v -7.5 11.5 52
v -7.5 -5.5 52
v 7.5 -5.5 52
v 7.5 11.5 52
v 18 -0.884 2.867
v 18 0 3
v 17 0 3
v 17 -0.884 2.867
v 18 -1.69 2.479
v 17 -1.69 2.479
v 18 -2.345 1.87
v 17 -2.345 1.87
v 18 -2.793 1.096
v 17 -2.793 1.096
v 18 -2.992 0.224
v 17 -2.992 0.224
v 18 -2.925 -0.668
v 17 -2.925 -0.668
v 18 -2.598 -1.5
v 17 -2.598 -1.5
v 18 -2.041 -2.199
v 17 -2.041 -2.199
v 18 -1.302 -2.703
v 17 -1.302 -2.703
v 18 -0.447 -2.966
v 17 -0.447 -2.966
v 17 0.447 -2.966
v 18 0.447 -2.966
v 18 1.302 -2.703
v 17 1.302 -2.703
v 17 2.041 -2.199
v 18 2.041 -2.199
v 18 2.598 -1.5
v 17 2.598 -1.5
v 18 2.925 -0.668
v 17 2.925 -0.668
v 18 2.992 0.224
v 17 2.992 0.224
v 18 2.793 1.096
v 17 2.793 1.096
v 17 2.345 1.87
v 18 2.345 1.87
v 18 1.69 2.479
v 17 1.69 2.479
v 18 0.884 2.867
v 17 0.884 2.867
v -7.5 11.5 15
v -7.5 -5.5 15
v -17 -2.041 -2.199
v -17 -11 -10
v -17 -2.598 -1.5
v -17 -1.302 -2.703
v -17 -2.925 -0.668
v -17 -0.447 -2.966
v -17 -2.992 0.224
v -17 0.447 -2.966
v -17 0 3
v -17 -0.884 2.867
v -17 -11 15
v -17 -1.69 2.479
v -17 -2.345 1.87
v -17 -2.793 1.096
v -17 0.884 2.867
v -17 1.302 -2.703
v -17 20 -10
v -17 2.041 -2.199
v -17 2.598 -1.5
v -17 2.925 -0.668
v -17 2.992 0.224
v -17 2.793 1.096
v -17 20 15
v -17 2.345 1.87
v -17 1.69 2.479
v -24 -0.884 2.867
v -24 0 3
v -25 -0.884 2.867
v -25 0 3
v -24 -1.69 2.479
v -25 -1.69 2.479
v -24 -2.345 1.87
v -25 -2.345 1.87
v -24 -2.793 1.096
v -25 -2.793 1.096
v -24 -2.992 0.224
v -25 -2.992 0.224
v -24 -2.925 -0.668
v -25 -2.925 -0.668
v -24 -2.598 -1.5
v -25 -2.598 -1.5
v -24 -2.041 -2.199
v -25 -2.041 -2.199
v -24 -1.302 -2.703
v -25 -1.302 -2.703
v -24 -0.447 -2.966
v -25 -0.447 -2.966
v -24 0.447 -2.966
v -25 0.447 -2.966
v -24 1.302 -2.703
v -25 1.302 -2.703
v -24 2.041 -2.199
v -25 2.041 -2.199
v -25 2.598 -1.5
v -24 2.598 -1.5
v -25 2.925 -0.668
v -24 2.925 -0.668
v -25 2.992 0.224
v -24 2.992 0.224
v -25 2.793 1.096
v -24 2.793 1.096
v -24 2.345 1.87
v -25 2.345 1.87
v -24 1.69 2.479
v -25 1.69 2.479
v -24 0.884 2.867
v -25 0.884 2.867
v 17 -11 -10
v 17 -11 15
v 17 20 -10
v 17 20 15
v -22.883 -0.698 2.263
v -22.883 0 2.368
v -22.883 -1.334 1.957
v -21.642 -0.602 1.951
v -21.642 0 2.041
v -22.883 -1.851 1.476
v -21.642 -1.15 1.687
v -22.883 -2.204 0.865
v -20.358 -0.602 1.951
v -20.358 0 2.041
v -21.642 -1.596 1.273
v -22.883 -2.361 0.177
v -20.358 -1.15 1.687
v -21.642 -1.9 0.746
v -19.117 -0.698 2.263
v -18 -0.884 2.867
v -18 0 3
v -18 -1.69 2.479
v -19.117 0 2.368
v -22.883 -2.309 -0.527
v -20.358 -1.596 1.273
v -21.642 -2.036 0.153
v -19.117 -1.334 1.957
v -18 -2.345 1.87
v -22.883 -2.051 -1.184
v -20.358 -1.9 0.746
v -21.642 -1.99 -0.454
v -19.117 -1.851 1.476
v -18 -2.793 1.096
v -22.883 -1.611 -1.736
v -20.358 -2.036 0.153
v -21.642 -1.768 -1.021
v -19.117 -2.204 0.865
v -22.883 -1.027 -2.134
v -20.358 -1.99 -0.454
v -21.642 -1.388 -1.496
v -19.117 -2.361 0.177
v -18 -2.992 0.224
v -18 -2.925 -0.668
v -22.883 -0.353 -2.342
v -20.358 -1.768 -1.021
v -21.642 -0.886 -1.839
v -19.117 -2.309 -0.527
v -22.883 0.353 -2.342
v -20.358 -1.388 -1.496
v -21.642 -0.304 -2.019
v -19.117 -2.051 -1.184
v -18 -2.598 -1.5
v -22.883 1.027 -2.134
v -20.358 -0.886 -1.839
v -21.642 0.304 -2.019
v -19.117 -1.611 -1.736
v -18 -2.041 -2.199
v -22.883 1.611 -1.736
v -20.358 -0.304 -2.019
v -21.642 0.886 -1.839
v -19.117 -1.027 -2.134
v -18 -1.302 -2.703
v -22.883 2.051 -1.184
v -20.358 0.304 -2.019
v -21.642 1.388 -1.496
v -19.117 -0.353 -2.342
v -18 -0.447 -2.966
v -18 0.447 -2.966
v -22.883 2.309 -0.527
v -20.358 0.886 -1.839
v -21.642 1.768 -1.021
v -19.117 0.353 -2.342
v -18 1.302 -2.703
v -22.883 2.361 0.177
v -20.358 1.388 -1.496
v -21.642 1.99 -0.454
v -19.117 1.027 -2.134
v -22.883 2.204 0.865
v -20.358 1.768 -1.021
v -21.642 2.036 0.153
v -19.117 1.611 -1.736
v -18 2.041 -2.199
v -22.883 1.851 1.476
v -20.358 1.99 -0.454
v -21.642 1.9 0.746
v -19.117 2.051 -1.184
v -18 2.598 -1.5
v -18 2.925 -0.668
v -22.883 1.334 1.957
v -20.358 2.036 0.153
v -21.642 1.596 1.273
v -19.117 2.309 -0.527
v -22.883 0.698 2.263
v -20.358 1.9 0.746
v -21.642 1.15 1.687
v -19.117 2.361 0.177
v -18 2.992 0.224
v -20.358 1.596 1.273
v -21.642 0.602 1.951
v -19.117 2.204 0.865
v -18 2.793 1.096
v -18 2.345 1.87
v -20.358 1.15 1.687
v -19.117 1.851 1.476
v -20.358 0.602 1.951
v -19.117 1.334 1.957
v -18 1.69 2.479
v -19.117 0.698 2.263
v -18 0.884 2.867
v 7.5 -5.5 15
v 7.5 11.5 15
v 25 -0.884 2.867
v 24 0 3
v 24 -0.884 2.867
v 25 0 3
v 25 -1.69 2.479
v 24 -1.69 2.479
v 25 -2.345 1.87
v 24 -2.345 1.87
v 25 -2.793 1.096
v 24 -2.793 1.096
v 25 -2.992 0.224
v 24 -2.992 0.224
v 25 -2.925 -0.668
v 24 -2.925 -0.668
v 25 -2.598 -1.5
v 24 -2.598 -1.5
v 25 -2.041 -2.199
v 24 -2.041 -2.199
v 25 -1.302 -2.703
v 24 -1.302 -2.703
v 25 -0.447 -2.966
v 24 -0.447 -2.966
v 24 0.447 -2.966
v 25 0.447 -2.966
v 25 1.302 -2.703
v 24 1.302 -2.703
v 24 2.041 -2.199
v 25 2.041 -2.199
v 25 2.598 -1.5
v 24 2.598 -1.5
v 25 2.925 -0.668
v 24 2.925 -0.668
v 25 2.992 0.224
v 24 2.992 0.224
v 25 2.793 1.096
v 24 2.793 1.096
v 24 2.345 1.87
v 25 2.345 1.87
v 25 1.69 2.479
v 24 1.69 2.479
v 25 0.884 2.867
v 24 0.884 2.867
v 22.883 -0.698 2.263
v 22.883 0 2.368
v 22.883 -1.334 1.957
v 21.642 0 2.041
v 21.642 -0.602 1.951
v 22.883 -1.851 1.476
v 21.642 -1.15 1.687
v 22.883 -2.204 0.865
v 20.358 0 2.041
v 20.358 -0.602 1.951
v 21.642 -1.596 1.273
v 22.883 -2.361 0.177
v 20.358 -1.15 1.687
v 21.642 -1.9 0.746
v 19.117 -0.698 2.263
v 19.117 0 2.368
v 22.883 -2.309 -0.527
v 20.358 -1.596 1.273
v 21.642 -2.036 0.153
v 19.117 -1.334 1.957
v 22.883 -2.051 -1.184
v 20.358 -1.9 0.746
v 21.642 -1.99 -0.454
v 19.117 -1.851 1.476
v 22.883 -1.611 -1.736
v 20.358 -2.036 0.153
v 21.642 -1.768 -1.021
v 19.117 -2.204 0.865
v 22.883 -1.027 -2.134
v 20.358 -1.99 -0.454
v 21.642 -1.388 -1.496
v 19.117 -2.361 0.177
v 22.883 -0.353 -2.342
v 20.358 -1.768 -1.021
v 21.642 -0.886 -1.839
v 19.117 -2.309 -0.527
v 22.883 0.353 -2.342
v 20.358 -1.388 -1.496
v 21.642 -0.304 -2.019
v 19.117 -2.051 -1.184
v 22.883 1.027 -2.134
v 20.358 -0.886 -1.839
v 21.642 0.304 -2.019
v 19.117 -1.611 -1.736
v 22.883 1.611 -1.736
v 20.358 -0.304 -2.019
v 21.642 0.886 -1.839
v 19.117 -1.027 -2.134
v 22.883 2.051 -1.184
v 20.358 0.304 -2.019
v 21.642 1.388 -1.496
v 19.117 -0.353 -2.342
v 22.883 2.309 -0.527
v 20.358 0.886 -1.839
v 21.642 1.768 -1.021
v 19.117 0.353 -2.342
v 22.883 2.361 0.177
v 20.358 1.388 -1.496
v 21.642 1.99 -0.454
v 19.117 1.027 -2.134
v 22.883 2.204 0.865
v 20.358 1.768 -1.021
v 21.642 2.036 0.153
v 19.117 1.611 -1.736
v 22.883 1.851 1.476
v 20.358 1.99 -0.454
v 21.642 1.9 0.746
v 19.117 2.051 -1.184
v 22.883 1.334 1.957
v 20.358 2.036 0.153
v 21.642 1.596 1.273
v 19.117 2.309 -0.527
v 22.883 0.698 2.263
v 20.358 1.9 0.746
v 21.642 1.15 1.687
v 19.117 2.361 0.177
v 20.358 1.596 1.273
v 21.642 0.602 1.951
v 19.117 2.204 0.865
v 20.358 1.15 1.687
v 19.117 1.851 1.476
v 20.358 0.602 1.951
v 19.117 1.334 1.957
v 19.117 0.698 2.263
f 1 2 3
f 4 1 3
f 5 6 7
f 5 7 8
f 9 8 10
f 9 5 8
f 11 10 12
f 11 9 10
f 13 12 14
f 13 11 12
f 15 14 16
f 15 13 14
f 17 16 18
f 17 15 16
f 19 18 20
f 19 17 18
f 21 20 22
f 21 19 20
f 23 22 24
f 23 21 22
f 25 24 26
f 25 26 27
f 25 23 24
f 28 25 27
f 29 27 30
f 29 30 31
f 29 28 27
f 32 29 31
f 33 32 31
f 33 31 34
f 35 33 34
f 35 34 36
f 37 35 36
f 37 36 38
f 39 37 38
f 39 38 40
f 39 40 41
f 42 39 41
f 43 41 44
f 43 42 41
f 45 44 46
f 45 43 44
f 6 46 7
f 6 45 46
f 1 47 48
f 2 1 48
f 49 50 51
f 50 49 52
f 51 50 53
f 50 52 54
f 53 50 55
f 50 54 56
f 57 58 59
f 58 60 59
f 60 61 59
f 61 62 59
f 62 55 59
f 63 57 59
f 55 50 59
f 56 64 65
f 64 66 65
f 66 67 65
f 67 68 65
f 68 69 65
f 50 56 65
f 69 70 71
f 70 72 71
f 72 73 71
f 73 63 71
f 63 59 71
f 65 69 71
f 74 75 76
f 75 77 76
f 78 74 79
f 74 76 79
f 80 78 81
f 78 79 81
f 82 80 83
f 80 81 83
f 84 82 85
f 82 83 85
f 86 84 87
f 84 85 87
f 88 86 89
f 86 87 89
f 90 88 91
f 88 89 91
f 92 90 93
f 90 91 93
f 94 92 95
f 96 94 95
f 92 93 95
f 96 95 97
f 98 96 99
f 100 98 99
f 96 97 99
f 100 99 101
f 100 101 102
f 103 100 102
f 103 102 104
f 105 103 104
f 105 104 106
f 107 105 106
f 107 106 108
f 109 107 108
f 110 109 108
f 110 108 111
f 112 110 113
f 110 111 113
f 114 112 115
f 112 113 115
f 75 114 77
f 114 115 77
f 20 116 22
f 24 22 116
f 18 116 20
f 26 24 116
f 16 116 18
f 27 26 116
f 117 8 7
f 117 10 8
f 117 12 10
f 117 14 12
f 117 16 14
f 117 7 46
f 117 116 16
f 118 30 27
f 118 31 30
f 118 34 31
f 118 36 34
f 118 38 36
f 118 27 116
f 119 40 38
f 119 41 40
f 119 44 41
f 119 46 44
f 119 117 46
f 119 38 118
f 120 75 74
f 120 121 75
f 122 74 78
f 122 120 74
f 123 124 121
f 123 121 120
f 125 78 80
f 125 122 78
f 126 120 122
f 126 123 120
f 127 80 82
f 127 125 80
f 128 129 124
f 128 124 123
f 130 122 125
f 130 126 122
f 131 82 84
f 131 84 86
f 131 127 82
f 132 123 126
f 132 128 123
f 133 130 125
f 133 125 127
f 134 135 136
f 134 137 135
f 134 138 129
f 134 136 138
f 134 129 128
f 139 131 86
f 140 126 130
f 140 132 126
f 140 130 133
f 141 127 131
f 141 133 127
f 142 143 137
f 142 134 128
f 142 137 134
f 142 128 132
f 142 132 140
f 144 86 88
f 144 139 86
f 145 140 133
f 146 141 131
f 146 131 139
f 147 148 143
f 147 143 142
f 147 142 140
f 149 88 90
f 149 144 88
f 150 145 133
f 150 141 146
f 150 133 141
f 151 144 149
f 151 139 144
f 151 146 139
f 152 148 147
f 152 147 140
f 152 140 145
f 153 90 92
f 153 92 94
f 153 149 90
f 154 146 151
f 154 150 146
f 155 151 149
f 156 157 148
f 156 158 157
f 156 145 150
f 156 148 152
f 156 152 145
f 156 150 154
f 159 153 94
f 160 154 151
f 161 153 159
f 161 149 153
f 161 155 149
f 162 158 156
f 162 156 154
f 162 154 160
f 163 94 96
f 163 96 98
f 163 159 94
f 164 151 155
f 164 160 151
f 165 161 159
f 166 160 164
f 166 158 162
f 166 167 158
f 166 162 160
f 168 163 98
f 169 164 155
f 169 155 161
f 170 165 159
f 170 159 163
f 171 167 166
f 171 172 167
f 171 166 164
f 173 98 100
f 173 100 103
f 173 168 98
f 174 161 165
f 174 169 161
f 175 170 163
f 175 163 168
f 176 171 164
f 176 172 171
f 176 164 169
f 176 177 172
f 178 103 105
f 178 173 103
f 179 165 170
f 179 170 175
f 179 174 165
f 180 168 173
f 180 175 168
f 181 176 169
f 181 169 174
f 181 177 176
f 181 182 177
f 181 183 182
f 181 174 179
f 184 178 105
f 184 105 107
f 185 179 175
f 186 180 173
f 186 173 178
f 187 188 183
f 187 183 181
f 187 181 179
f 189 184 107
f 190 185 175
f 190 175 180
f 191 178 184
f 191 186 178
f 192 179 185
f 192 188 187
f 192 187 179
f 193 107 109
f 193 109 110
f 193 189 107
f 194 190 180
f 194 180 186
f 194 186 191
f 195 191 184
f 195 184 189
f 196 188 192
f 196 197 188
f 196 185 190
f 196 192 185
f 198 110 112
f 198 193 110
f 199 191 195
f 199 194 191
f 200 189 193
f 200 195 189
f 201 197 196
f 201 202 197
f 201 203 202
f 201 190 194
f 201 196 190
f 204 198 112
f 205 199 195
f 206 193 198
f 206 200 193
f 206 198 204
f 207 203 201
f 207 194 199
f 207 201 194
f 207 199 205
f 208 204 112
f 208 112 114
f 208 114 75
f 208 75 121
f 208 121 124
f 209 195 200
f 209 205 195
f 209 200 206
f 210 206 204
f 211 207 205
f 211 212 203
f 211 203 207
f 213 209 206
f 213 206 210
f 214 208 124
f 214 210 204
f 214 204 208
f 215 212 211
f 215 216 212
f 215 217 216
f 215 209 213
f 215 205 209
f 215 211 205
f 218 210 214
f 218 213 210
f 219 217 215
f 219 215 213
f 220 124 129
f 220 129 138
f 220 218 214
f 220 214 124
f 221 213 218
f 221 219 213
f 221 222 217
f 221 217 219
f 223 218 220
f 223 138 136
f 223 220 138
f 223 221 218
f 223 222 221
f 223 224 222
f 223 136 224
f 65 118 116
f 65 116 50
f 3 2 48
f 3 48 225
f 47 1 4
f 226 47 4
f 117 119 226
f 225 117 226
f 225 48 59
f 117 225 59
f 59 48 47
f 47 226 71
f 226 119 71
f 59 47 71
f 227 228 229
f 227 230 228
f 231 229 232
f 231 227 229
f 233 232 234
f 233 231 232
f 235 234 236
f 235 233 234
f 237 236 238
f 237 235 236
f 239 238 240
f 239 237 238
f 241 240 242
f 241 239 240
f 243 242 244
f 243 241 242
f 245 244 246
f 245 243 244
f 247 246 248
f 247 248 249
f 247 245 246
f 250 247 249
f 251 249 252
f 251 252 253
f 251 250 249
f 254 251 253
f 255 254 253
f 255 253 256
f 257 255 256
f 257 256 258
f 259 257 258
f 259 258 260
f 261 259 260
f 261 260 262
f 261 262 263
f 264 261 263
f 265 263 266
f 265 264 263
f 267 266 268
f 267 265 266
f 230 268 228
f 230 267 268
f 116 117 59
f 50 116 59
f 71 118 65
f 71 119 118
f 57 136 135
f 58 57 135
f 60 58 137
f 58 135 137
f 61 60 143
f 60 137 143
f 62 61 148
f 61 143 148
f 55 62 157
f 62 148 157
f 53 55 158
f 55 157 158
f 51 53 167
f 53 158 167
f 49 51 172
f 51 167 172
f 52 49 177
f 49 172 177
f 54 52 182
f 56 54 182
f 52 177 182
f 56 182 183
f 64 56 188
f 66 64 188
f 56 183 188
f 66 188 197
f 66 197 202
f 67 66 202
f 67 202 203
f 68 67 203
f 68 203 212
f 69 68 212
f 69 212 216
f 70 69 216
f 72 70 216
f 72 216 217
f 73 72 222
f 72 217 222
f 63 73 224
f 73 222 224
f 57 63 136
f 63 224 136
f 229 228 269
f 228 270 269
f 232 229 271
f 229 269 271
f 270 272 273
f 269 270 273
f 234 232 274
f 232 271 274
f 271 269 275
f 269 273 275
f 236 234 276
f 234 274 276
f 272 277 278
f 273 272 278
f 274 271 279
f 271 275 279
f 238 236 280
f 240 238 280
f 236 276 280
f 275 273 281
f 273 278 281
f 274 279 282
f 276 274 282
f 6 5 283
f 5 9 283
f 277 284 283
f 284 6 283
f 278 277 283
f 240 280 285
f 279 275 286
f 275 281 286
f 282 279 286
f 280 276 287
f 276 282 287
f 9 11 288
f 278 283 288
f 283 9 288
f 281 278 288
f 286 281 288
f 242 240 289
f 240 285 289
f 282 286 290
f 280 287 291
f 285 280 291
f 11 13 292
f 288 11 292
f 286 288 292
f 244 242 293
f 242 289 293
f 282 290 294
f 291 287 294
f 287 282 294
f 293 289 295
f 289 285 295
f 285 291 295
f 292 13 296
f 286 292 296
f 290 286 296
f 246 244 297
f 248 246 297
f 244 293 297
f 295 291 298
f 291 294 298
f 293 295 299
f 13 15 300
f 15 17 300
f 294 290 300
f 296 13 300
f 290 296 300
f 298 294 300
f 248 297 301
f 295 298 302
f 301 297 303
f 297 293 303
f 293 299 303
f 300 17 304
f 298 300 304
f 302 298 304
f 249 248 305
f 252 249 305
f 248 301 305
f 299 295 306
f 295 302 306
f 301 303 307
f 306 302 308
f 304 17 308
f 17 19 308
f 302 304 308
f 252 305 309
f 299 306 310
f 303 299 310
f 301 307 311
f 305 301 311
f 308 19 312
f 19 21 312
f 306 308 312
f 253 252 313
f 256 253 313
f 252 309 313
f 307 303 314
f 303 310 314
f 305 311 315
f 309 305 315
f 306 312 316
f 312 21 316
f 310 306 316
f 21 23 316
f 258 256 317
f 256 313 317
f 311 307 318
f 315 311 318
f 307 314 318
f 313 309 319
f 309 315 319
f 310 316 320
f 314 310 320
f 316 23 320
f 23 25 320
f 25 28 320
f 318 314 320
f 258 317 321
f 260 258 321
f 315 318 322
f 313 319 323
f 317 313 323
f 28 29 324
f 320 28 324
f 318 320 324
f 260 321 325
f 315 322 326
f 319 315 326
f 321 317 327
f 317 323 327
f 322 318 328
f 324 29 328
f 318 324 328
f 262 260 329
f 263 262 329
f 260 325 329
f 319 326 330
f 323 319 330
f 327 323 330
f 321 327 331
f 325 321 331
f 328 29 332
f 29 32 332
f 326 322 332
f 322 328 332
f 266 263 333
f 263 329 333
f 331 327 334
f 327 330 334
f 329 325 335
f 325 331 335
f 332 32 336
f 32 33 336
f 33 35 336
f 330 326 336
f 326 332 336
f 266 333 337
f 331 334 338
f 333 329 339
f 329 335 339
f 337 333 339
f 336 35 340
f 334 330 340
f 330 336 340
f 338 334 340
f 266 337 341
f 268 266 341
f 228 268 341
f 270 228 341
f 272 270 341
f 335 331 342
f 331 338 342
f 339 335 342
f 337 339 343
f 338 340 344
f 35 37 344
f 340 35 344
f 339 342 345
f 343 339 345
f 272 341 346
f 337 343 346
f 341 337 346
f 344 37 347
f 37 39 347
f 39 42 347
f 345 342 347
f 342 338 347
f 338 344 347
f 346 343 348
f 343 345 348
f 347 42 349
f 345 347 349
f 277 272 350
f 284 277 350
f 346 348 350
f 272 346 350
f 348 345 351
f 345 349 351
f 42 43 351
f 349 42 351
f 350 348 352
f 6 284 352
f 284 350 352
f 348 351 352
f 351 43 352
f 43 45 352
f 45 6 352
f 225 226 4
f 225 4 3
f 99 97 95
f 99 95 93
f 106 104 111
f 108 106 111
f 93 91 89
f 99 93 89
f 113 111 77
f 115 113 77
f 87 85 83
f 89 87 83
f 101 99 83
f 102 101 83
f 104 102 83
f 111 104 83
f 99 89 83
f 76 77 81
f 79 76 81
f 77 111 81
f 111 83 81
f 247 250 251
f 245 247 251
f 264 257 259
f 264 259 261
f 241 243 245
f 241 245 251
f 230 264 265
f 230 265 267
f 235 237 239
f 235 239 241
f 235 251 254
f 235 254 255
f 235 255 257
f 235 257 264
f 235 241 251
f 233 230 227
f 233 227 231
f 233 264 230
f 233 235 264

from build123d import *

# Parameters (mm, degrees)
SKETCH016_W       = 17
SKETCH016_H       = 31
PAD011_DEPTH      = 15
PAD011_DEPTH_BACK = 10
SKETCH017_W       = 7.5
SKETCH017_H       = 17
PAD012_DEPTH      = 37


with BuildPart() as part:
    # Sketch014 → Revolution002 (revolve)
    with BuildSketch(Plane.XZ):
        with BuildLine():
            Line((-24, 3), (-25, 3))
            Line((-25, 3), (-25, 0))
            Line((-25, 0), (-17, 0))
            Line((-17, 0), (-17, 3))
            Line((-17, 3), (-18, 3))
            ThreePointArc((-24, 3), (-21, 2), (-18, 3))
        make_face()
    revolve(axis=Axis((0, 0, 0), (1, 0, 0)))

    # Sketch016 → Pad011 (new body, two sides)
    with BuildSketch(Plane.XY) as pad011_sk:
        with Locations((-8.5, 4.5)):
            Rectangle(SKETCH016_W, SKETCH016_H)
    extrude(amount=PAD011_DEPTH)
    extrude(pad011_sk.sketch, amount=-PAD011_DEPTH_BACK)

    # Sketch017 (on Face8 of Pad011) → Pad012 (join)
    with BuildSketch(Plane(origin=(0, 0, 15), x_dir=(-1, 0, 0), z_dir=(0, 0, 1))):
        with Locations((3.75, -3)):
            Rectangle(SKETCH017_W, SKETCH017_H)
    extrude(amount=PAD012_DEPTH)

    # Mirrored002: part across YZ


with BuildPart() as part_1:
    add(part.part)
    add(part.part.mirror(Plane.YZ))


solid = part_1.part
